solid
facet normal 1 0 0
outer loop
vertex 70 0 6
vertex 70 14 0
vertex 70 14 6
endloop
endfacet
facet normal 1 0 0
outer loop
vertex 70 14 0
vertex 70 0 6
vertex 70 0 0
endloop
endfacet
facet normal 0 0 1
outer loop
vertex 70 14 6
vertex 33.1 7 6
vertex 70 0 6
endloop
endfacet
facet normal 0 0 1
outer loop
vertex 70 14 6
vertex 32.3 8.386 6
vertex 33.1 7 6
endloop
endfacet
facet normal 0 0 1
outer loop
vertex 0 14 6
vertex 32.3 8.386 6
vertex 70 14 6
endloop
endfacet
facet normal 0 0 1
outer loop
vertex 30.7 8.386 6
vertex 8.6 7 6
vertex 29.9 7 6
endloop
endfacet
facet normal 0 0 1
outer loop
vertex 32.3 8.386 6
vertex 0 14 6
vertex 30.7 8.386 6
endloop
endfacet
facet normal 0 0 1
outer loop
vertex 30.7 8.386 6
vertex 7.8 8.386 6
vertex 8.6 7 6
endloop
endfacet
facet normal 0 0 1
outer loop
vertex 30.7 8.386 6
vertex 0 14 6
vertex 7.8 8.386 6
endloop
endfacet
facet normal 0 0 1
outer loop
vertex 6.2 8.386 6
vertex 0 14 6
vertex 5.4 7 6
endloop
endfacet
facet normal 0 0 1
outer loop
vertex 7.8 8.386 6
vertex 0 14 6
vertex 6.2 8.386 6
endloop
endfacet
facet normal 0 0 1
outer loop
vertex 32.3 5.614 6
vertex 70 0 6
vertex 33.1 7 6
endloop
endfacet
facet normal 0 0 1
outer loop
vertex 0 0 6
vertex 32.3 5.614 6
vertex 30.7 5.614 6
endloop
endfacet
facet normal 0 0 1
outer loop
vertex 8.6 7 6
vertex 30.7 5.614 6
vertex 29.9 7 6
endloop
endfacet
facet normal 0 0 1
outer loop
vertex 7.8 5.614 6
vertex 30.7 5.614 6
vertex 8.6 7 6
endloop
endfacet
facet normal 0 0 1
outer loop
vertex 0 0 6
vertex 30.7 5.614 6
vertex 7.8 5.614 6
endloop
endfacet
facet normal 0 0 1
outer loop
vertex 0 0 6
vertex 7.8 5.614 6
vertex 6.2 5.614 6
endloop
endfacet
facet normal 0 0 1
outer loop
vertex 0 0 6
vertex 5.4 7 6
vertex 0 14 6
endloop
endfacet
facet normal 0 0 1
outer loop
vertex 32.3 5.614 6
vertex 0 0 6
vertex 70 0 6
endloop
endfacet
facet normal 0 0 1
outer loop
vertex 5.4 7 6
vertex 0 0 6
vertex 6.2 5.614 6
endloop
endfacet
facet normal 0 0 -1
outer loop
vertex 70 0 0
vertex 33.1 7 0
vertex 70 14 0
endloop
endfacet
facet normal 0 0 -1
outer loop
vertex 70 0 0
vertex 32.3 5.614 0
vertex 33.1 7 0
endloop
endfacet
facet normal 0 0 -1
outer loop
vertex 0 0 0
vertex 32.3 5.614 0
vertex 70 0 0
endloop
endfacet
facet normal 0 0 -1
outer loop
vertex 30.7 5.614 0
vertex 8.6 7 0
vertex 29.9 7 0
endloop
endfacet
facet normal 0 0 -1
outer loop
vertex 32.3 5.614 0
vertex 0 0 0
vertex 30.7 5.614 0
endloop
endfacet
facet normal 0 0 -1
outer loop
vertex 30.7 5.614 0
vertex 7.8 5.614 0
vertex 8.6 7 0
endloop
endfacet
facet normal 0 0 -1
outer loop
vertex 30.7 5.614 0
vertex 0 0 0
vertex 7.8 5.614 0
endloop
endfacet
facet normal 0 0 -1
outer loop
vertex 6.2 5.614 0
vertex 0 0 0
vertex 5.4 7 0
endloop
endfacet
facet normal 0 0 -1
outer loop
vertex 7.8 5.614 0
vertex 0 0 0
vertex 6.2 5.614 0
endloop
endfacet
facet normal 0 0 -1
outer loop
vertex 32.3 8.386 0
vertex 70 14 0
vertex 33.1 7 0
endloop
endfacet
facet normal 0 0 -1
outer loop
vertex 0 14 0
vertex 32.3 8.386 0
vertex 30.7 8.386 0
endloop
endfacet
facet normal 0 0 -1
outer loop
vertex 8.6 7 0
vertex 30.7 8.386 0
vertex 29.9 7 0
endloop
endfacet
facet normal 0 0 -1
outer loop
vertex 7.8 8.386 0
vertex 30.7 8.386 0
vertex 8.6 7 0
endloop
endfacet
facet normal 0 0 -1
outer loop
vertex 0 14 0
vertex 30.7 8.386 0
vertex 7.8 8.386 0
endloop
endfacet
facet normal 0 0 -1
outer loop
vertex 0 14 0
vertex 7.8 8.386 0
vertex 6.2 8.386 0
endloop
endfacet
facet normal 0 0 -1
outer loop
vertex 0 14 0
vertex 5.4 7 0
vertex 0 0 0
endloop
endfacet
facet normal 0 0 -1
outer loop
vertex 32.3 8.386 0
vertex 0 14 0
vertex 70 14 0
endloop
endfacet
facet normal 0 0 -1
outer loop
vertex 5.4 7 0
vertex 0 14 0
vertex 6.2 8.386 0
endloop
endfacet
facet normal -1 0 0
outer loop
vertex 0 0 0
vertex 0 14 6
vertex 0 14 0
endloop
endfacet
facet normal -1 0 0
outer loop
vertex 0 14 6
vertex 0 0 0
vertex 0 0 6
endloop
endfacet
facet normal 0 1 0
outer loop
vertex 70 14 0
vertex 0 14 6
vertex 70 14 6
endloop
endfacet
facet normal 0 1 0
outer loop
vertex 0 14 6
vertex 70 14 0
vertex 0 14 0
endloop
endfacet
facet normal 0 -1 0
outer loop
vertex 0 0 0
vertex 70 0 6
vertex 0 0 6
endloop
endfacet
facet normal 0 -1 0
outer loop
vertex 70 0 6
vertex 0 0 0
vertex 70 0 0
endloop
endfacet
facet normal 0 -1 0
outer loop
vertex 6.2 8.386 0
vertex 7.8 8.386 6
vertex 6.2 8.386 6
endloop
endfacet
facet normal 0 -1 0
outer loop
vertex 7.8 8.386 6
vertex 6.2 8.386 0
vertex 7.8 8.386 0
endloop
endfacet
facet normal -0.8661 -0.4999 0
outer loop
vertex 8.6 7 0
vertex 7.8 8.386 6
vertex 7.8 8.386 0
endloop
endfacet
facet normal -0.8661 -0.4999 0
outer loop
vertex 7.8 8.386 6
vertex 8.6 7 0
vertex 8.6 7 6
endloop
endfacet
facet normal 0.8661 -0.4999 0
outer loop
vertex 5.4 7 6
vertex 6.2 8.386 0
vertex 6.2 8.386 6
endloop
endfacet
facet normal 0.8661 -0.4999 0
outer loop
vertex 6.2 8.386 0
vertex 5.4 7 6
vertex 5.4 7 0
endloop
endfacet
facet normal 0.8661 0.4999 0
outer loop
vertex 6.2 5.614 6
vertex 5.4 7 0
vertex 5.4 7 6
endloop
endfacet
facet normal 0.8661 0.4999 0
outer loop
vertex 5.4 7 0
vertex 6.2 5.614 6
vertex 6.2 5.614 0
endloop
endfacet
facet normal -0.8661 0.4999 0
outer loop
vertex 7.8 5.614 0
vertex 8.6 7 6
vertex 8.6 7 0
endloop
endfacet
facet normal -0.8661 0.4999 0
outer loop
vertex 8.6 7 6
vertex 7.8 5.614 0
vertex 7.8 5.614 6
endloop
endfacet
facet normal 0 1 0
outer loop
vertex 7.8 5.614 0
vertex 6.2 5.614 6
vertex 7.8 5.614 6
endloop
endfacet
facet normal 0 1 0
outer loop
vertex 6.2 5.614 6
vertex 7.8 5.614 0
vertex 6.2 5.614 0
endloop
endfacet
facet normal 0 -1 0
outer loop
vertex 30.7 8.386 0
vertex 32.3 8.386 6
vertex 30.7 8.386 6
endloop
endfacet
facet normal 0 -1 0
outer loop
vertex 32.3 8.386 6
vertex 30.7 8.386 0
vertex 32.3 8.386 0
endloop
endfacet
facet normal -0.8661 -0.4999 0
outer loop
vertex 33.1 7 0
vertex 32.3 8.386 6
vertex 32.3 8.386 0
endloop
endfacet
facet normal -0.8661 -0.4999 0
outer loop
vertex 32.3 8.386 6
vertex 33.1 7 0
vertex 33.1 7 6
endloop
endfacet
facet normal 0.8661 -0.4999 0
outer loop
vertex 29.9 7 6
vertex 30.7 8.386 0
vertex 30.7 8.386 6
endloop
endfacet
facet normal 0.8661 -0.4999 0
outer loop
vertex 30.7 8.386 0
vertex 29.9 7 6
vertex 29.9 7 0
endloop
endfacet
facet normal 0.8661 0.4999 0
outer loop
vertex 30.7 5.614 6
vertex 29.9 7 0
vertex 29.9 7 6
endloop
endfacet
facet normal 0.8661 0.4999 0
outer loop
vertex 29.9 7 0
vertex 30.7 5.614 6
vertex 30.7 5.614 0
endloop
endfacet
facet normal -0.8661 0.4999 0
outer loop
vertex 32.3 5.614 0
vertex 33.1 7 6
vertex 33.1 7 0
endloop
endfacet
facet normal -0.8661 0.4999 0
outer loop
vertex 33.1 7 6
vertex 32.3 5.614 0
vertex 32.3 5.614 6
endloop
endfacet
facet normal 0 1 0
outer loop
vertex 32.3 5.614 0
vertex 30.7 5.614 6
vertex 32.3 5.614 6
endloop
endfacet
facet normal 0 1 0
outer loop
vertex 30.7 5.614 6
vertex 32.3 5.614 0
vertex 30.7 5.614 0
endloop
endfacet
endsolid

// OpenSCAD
module gr_jaw_right() {
  len=70.0; w=14.0; t=6.0;
  difference() {
    cube([len,w,t], center=false);
    translate([w/2, w/2, -1]) cylinder(h=t+2, d=3.2, center=false);
    translate([31.50, w/2, -1]) cylinder(h=t+2, d=3.2, center=false);
  }
}
gr_jaw_right();
